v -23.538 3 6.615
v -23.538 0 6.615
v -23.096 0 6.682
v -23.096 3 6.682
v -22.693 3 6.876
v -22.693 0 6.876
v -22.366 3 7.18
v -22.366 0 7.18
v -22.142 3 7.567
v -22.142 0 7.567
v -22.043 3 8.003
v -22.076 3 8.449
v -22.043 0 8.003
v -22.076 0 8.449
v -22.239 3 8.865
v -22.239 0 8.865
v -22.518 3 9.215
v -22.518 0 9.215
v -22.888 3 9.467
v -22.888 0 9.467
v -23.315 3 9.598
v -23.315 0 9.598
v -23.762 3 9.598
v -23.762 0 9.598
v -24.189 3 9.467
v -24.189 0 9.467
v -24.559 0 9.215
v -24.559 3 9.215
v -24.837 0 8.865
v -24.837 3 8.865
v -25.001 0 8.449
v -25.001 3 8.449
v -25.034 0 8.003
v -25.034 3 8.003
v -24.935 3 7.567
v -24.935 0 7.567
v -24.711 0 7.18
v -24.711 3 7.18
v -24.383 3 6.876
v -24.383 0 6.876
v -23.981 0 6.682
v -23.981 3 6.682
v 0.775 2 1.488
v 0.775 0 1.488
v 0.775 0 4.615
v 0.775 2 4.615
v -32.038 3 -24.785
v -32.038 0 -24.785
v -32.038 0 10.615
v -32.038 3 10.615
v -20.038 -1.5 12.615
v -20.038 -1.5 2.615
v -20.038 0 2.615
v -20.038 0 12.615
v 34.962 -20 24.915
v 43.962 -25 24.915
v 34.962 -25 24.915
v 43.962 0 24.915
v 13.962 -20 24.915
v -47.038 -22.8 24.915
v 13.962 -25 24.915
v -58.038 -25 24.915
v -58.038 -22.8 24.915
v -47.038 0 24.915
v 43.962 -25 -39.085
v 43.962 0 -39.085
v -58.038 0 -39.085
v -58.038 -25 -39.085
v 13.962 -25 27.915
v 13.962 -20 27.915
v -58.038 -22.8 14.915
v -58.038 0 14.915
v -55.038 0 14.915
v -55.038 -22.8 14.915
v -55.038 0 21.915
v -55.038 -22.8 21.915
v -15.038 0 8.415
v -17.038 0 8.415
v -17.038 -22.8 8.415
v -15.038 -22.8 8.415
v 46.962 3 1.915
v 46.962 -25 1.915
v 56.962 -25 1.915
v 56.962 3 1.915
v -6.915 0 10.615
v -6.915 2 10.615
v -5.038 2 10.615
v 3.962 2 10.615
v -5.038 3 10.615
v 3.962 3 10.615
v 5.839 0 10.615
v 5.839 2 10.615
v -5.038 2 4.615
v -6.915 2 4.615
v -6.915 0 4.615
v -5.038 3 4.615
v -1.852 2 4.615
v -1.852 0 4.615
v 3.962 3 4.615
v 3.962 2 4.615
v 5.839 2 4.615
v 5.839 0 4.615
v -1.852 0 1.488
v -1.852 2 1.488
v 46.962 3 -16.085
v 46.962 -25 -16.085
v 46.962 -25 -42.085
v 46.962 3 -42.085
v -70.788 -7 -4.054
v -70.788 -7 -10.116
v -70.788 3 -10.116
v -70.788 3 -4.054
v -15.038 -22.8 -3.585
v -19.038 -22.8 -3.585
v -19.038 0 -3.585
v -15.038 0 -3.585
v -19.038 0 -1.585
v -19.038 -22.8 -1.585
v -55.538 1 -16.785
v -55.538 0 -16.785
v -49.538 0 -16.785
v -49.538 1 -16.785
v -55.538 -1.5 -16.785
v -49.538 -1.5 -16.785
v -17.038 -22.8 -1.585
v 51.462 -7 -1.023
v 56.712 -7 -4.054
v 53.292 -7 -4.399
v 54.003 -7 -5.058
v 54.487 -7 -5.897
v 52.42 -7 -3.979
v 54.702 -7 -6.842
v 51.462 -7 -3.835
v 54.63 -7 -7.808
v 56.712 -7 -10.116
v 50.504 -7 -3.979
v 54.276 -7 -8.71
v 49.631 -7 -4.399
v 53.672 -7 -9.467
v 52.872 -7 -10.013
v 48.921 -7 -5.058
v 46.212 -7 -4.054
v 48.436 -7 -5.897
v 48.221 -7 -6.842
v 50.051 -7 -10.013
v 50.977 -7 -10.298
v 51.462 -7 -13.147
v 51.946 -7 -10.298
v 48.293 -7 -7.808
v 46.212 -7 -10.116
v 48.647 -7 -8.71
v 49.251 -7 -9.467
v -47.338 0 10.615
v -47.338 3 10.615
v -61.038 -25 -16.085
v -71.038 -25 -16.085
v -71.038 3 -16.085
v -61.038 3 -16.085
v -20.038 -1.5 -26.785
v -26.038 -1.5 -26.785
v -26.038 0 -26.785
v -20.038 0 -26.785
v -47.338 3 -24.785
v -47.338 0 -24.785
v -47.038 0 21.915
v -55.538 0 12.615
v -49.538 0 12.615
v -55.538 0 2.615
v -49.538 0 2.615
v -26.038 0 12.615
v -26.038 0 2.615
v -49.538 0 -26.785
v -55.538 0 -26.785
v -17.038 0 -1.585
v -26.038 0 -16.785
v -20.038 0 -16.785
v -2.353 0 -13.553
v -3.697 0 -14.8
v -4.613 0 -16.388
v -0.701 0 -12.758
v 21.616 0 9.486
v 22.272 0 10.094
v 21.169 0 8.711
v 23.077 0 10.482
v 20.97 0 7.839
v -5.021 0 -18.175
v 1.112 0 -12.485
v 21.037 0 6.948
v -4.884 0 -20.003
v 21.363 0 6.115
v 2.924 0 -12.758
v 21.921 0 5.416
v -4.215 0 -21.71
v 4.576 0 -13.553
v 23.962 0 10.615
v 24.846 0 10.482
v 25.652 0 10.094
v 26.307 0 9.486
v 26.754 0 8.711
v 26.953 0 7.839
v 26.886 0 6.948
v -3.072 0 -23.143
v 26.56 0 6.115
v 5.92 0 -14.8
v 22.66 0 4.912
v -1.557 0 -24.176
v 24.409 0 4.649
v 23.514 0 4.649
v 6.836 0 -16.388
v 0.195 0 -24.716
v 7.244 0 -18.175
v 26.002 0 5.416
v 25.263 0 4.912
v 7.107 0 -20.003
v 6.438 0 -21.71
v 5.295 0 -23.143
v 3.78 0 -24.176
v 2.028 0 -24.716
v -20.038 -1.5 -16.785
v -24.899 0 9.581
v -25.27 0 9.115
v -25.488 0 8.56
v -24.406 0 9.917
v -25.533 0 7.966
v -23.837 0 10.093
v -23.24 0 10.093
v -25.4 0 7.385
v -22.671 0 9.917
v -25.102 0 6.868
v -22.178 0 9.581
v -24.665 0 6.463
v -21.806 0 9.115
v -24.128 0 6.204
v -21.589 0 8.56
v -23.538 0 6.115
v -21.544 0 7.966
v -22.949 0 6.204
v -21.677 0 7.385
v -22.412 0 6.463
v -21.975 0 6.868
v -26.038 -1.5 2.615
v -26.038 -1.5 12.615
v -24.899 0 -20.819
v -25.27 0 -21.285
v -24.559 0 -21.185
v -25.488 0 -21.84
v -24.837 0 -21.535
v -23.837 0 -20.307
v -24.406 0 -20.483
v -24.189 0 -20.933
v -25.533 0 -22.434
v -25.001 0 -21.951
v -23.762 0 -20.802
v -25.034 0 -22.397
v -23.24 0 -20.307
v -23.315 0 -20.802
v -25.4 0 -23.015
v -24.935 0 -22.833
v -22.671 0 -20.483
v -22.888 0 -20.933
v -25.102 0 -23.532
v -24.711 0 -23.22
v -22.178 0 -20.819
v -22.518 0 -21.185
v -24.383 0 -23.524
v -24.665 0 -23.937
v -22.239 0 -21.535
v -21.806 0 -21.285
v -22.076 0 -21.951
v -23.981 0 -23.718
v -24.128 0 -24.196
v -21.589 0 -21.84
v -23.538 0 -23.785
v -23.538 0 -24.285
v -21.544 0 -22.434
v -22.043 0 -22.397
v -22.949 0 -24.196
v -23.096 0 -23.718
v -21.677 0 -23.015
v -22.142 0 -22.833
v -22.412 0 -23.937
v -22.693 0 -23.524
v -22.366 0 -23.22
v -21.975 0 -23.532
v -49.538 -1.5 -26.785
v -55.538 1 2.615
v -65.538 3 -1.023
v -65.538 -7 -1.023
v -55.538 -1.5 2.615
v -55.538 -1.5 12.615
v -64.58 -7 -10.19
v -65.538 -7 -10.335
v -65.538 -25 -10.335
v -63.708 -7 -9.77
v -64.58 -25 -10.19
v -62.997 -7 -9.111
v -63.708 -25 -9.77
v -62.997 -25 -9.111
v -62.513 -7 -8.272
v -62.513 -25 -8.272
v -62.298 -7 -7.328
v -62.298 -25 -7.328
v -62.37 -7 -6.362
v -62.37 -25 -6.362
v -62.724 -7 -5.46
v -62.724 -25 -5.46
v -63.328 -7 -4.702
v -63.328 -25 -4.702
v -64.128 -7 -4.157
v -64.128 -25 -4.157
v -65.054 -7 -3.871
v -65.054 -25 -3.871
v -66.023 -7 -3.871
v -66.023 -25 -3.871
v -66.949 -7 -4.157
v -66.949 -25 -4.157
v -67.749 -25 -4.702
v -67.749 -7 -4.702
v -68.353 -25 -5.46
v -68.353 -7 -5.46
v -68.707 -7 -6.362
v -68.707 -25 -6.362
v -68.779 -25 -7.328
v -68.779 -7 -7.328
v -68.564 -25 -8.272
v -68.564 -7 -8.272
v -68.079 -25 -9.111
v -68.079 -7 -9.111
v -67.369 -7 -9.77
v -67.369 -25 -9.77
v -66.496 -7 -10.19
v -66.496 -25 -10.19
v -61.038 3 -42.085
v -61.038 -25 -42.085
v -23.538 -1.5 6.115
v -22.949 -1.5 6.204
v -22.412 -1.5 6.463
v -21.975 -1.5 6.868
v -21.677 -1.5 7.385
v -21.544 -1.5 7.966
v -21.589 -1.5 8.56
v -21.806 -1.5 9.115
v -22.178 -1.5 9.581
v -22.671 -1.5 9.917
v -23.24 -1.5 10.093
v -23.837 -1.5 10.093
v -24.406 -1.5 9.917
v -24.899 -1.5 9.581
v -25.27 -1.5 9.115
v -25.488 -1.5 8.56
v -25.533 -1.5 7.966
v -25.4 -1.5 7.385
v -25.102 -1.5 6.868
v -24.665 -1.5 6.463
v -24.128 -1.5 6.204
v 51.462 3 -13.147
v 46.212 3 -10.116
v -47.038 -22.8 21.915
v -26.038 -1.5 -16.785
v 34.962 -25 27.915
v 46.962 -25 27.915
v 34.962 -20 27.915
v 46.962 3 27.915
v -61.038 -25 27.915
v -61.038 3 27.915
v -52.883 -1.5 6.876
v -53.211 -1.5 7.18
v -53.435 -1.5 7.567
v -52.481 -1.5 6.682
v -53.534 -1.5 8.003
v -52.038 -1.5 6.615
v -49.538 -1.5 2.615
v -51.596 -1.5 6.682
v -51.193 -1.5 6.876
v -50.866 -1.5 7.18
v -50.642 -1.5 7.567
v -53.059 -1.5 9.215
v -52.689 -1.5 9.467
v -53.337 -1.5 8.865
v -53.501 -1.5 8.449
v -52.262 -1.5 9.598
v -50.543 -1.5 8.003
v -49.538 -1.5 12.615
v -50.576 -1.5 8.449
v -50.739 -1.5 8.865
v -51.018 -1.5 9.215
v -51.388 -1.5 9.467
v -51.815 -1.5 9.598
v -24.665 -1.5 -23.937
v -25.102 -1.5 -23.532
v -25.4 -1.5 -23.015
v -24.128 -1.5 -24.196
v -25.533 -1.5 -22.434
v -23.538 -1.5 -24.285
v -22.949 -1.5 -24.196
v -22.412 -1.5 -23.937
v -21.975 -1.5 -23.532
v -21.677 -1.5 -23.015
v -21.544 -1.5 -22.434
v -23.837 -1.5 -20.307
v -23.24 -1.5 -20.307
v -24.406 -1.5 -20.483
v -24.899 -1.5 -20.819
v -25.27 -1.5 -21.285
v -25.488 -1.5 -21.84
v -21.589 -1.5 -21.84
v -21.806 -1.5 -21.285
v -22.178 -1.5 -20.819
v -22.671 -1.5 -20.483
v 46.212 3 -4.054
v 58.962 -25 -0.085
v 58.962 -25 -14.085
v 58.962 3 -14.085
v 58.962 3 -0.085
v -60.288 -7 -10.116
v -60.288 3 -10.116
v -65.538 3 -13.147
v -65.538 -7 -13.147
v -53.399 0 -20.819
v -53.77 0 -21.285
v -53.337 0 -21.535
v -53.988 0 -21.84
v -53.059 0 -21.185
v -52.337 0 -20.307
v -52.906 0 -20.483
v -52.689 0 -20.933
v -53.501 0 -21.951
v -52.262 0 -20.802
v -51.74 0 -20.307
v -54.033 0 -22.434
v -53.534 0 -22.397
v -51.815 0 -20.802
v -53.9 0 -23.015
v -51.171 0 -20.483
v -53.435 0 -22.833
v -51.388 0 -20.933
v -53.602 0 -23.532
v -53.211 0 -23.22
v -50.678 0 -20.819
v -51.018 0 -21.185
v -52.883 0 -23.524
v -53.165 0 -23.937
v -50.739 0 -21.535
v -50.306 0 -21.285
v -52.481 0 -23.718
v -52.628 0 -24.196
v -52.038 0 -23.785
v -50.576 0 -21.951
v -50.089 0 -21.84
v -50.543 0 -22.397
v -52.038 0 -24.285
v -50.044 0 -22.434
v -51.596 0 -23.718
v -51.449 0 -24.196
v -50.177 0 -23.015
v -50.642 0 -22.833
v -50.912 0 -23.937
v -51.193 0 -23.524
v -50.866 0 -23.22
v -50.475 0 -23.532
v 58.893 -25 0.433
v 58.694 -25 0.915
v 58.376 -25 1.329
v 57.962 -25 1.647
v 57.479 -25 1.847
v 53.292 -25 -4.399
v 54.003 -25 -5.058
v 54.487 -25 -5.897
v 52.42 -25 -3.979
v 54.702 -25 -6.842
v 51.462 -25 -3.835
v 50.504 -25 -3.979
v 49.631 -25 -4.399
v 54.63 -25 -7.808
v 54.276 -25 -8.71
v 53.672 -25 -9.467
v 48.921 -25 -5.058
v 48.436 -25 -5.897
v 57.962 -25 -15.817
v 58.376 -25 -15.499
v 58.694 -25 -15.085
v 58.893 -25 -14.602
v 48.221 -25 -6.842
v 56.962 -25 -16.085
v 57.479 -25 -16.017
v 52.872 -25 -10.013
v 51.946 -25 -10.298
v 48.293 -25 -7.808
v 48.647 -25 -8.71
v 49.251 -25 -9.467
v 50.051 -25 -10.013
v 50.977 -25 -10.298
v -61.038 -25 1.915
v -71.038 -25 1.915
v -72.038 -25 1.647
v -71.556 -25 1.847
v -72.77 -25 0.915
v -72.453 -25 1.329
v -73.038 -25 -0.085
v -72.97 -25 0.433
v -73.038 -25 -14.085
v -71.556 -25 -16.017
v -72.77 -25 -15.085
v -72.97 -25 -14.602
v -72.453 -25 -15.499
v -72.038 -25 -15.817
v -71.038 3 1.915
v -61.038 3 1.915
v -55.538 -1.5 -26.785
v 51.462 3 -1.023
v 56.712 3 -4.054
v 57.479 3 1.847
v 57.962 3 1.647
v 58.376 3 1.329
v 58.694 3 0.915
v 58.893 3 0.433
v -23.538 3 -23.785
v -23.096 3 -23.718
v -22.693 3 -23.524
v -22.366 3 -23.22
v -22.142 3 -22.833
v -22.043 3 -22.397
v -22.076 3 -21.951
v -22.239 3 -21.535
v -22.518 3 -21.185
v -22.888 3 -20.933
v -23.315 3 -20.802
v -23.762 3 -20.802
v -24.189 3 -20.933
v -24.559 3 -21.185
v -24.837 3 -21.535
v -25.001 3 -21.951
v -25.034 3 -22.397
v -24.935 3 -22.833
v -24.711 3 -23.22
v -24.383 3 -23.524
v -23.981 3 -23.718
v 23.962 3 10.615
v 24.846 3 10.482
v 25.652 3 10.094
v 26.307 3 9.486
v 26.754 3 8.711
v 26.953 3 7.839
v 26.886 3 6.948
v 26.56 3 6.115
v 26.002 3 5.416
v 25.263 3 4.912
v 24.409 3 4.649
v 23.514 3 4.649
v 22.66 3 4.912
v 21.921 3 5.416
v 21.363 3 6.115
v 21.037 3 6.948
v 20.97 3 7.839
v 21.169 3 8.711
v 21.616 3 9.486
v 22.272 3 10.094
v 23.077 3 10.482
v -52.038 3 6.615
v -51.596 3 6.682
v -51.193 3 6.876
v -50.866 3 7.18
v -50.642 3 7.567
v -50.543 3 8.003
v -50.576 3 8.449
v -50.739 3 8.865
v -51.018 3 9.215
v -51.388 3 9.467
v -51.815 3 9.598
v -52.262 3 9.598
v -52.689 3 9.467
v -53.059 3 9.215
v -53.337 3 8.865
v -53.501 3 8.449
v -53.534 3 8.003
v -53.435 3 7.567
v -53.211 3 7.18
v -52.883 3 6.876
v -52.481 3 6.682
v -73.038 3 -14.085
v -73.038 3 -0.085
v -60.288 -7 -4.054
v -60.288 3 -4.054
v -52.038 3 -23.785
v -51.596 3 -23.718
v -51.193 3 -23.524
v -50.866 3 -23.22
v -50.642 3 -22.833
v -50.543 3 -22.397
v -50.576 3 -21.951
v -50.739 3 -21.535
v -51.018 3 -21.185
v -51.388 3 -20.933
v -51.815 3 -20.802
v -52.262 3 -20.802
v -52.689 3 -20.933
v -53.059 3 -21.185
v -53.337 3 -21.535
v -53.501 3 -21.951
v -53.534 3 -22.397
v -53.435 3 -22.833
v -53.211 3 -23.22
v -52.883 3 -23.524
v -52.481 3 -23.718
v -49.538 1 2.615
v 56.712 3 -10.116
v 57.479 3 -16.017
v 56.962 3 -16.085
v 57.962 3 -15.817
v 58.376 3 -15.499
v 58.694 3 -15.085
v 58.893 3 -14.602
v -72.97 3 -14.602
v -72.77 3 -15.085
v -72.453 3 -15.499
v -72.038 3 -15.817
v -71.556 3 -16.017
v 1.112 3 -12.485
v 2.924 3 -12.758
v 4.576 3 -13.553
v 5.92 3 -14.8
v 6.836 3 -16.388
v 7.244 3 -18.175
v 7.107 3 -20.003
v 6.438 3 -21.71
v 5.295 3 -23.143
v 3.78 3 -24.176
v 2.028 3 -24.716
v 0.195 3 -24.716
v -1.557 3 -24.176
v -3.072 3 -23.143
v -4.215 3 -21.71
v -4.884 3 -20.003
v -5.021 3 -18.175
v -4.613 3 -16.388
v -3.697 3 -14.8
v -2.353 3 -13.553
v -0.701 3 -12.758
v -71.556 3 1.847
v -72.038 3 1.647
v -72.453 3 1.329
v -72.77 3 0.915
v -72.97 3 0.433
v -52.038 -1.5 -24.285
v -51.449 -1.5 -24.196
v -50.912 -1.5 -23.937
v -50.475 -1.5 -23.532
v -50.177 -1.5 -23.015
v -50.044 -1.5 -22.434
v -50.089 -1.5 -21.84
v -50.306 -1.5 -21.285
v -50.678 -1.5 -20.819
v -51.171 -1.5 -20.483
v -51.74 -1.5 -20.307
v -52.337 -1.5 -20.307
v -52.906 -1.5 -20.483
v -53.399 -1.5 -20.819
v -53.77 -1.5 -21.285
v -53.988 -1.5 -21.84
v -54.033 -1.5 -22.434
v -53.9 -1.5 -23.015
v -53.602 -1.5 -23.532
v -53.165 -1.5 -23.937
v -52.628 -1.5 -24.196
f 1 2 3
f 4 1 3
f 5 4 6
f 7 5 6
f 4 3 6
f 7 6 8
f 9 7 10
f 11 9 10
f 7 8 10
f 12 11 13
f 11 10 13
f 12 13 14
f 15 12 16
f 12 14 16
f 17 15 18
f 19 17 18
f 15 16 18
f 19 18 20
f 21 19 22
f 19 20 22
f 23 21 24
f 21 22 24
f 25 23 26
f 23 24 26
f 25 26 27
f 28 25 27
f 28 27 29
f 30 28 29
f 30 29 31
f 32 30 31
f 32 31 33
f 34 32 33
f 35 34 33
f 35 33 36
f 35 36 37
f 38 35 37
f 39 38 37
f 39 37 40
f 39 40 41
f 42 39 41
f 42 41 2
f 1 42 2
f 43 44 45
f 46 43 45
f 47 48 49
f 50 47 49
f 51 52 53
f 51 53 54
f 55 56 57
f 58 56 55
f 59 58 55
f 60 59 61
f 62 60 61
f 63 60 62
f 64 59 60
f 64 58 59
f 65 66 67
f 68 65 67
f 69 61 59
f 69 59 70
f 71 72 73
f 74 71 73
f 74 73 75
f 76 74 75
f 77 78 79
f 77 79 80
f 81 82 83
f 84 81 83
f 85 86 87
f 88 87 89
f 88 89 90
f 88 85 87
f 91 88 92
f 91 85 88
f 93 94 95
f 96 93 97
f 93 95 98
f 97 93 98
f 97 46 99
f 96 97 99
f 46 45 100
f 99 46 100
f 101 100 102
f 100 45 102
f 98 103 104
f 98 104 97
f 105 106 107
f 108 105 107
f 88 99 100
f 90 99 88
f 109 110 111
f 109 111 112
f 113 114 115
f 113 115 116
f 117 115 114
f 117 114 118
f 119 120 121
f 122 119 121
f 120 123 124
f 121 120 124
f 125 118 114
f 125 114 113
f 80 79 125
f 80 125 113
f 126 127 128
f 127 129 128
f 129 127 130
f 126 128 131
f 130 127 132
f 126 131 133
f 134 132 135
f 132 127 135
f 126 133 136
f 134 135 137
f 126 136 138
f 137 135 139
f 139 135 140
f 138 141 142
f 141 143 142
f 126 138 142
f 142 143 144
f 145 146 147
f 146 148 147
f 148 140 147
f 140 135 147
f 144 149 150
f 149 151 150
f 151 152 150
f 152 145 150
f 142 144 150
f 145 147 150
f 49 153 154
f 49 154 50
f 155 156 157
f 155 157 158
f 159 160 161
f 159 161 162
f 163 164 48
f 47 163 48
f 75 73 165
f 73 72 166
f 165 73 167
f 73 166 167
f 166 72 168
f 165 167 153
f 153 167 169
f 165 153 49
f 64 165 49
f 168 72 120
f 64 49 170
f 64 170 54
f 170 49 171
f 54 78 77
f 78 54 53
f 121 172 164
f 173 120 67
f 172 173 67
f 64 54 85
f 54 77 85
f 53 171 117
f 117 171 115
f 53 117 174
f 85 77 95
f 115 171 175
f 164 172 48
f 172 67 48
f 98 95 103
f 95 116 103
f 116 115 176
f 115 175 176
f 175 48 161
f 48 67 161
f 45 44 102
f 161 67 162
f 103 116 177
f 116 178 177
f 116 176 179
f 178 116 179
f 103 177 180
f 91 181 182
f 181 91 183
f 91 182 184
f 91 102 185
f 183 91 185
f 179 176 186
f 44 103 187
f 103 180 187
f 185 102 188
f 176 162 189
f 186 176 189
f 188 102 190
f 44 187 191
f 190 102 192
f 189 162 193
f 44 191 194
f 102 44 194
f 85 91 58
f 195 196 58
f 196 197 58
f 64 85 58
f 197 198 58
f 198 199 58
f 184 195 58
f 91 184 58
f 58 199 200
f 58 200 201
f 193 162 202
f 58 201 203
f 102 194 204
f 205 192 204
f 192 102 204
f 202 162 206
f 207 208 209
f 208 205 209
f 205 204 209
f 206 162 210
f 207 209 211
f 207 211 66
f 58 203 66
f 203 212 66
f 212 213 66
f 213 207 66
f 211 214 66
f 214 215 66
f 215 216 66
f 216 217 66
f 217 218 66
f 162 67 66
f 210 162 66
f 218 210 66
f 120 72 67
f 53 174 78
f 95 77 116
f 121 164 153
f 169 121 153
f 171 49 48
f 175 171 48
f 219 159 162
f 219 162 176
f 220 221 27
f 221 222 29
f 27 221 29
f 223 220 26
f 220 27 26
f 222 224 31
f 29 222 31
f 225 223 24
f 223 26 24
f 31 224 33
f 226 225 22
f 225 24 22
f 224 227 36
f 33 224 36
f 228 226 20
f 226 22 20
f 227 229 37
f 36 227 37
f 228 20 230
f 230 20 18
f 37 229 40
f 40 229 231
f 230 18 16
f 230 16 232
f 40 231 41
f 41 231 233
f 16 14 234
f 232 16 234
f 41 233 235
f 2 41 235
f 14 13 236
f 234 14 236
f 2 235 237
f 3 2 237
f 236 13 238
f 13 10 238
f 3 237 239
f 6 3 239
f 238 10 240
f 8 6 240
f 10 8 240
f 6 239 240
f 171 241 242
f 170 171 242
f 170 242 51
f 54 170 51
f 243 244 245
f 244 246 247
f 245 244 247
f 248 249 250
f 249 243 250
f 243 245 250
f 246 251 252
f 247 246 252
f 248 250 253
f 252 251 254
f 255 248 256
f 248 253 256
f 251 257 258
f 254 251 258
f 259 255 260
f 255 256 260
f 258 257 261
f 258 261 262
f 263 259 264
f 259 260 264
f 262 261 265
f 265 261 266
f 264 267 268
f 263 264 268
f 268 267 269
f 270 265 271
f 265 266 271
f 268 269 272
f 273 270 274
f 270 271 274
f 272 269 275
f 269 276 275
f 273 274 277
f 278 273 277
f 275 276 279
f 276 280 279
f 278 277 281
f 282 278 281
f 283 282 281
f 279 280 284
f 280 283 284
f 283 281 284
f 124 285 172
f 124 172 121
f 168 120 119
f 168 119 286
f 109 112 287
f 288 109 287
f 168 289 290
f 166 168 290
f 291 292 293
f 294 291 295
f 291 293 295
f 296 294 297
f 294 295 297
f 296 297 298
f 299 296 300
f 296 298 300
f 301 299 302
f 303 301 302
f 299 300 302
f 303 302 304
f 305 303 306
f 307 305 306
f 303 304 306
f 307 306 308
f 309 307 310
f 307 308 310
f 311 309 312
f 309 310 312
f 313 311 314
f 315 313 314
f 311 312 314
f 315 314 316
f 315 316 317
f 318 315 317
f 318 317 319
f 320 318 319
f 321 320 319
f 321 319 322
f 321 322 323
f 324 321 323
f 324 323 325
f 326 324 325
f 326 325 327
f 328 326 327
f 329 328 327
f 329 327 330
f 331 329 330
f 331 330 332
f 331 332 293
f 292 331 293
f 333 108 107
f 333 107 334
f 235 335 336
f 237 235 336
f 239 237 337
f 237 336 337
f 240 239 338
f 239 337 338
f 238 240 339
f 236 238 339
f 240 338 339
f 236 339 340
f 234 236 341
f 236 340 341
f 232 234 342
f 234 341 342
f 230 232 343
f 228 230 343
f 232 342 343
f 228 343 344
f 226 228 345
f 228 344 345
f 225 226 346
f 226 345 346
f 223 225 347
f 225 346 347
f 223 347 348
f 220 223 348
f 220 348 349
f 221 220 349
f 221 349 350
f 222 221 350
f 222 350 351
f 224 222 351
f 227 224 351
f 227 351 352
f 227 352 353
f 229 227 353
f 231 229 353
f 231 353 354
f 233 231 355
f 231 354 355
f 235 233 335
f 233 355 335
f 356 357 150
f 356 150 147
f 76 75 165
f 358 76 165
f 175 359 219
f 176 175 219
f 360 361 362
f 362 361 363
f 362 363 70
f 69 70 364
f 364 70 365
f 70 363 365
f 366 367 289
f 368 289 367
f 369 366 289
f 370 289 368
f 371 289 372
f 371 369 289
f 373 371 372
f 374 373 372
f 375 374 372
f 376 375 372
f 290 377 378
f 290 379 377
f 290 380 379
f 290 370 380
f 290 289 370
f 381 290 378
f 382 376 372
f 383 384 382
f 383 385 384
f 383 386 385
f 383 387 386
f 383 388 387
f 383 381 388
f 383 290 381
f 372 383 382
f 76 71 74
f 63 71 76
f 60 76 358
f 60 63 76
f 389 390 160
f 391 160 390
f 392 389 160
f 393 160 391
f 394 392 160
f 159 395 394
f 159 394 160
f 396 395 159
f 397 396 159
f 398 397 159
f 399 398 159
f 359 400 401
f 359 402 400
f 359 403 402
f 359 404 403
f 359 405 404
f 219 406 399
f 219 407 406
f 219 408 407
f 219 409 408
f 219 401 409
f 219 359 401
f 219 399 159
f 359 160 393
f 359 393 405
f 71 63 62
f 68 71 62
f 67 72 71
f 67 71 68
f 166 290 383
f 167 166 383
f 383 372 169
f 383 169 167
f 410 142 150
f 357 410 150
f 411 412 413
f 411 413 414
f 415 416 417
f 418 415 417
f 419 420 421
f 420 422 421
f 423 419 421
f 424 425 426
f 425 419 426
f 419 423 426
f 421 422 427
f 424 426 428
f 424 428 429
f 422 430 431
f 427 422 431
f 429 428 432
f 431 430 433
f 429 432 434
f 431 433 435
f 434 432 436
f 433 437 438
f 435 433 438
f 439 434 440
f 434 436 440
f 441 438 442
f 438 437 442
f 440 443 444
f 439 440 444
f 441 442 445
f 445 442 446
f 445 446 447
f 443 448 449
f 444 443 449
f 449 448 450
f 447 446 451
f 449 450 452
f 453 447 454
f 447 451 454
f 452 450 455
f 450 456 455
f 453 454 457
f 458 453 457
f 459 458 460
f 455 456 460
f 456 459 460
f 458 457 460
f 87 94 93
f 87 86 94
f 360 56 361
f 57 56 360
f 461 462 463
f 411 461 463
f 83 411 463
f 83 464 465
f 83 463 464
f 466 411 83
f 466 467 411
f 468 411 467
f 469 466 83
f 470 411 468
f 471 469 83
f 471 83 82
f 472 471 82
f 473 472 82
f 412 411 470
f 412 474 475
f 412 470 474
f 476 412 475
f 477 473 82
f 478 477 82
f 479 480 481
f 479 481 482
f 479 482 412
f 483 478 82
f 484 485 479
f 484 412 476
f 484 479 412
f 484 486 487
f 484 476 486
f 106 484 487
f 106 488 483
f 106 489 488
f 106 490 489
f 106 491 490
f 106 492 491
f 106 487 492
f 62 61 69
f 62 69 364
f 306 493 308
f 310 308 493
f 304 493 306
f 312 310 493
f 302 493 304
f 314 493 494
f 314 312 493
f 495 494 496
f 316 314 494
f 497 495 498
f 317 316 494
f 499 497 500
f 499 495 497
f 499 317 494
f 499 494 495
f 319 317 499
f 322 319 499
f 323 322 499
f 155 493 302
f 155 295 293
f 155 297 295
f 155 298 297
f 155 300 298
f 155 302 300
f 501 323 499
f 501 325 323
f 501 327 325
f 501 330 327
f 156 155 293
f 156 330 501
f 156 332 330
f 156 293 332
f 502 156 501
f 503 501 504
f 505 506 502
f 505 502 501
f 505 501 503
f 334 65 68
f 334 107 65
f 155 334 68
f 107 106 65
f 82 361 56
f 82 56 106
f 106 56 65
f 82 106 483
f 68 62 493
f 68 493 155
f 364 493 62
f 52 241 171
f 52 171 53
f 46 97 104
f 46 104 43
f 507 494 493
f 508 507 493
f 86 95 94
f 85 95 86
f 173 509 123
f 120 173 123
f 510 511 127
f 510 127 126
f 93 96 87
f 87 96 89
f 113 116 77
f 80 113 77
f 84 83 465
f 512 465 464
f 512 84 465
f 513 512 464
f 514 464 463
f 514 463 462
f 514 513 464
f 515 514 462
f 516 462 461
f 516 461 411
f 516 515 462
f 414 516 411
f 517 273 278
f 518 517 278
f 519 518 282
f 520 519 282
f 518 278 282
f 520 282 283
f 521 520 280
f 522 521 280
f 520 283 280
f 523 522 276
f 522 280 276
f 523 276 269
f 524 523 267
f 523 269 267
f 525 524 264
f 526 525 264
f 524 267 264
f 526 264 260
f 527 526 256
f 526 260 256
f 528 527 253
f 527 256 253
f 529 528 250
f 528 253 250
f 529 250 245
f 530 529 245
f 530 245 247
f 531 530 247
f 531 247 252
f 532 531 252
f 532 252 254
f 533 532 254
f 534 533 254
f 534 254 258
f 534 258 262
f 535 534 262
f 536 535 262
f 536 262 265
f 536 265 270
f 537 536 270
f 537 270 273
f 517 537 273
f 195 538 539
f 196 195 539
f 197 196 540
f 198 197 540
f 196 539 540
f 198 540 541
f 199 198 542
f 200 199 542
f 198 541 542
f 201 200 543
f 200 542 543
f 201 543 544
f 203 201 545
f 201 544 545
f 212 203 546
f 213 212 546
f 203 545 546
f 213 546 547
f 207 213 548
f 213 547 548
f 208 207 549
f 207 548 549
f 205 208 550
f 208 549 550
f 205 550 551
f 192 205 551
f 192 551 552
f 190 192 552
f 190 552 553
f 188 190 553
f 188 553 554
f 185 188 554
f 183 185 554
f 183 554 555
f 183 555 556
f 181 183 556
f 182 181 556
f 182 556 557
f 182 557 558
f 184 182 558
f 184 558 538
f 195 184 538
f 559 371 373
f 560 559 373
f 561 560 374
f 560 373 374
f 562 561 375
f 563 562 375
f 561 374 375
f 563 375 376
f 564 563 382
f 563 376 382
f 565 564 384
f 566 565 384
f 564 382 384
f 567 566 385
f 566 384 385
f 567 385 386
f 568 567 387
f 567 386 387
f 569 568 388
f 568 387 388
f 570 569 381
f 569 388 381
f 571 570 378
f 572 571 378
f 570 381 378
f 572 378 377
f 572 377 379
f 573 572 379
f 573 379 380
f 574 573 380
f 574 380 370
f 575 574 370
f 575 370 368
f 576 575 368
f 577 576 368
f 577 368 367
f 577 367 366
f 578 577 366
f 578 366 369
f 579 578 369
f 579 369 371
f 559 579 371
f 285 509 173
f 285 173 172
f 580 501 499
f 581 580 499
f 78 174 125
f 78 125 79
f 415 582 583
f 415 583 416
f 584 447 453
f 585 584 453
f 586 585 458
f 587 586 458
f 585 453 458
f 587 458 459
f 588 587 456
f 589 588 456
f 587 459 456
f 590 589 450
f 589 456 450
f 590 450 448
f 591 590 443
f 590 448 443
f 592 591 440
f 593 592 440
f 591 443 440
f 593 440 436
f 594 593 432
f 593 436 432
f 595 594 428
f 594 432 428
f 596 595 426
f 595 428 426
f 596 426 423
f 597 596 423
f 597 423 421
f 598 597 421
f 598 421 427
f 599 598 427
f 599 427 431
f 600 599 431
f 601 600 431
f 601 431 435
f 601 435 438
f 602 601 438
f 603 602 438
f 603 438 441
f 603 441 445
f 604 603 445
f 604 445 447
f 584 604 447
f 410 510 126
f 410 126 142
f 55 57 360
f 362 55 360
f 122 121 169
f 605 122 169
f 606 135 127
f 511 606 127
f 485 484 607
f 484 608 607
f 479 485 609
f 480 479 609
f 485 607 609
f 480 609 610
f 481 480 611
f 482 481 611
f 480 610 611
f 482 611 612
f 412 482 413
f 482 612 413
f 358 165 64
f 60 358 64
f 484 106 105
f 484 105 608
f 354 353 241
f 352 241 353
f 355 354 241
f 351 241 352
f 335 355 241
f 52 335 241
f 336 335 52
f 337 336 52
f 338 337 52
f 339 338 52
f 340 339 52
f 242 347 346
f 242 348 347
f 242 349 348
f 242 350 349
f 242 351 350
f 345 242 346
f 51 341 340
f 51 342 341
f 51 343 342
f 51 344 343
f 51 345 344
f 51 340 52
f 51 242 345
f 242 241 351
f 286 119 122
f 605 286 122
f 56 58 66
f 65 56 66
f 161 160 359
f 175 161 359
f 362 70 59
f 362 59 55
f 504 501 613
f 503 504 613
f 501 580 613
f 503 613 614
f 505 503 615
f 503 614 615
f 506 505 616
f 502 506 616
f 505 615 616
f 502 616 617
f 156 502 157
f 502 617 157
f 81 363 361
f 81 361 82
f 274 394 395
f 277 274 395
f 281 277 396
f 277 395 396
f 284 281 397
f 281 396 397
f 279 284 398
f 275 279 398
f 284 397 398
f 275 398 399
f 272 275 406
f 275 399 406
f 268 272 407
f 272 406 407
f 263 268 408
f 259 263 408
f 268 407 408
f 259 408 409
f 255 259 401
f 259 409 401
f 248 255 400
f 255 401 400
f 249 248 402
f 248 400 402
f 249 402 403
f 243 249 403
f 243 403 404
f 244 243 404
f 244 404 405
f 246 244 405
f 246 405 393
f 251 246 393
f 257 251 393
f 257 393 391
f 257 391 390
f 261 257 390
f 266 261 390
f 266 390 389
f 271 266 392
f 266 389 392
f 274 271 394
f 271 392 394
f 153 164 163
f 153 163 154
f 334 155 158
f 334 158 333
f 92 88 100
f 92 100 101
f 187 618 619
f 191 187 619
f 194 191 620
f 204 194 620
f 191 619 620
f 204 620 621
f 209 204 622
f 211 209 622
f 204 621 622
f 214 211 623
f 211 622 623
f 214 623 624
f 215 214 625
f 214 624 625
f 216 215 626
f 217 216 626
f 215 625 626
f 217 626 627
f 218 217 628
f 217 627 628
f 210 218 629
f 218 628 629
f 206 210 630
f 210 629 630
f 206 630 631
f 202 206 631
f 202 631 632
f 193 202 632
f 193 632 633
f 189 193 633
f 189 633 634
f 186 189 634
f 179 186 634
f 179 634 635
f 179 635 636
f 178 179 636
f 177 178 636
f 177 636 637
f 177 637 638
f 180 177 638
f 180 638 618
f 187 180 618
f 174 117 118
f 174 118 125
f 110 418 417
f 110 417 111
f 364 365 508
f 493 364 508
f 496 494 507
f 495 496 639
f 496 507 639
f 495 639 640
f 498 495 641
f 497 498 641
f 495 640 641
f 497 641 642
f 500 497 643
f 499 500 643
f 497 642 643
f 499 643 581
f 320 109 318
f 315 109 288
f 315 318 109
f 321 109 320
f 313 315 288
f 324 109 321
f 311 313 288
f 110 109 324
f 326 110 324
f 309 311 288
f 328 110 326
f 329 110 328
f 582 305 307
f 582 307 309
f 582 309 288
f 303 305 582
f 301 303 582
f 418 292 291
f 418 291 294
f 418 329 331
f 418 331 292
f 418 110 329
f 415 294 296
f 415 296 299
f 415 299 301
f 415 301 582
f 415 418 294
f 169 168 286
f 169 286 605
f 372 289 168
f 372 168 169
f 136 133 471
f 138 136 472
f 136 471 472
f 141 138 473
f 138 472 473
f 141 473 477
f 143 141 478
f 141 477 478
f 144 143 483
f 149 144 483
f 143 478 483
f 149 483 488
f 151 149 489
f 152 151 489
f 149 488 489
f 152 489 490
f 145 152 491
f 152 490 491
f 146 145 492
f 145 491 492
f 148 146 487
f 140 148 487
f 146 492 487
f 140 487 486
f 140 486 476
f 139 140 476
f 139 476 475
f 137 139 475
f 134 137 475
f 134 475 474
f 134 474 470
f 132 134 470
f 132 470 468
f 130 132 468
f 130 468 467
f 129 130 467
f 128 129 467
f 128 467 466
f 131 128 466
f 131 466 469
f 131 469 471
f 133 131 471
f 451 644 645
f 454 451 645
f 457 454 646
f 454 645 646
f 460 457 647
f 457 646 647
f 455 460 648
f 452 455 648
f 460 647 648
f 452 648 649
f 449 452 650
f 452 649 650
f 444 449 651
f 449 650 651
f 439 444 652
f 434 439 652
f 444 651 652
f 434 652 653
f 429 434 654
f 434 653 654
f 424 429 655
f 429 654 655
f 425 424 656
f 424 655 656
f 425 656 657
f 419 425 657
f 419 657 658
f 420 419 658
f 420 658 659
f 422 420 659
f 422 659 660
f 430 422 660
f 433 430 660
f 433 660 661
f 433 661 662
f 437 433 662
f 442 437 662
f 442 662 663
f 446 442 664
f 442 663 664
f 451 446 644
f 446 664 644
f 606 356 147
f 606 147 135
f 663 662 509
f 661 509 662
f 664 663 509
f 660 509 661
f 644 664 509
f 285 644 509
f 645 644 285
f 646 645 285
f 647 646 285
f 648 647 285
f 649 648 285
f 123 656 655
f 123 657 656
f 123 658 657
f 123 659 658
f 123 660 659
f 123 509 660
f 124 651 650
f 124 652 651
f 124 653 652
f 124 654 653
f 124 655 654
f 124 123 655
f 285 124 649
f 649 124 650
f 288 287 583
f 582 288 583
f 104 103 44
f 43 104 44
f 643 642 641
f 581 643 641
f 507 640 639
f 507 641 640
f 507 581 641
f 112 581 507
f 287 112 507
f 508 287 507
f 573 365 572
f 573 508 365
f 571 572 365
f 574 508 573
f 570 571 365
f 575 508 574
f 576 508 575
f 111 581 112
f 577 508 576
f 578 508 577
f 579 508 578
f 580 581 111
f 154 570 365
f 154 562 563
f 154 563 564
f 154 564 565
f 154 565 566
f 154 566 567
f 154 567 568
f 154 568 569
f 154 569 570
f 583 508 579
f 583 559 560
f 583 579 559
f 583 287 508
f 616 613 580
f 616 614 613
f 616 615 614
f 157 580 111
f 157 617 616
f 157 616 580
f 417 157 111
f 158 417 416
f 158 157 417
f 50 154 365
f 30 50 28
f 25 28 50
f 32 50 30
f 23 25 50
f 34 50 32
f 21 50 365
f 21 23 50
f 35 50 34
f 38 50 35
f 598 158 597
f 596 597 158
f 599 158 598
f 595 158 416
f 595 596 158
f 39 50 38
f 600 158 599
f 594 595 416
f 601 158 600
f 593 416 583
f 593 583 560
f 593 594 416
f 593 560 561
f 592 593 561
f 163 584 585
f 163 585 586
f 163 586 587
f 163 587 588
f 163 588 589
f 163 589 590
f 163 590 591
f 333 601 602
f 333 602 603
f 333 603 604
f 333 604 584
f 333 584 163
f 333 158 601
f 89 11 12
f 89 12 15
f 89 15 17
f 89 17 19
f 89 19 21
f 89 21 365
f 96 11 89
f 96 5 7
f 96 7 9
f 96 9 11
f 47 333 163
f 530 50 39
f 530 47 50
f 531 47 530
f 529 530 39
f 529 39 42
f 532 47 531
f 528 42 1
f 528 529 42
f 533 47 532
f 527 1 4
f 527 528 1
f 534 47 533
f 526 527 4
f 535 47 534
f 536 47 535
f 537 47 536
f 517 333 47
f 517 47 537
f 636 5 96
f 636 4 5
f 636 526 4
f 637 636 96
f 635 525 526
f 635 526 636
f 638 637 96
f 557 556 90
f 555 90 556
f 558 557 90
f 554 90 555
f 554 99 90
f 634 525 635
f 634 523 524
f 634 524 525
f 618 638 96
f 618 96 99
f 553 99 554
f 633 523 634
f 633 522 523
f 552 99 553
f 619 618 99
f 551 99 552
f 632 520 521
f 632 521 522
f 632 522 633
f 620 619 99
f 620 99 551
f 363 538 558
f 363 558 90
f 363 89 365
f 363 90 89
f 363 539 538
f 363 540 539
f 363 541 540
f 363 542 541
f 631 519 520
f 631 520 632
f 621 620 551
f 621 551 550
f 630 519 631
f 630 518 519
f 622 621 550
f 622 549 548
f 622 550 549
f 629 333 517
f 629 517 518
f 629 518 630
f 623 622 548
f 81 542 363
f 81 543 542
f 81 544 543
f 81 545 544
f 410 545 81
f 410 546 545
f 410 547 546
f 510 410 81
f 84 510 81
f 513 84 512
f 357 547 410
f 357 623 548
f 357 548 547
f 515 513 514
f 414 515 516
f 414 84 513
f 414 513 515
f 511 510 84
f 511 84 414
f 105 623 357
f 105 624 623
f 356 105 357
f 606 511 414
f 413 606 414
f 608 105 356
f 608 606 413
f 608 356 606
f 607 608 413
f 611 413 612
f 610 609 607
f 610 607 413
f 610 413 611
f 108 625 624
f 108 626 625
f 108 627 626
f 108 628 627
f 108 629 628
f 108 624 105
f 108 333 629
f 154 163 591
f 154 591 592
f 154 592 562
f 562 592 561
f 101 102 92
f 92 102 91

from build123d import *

# Parameters (mm, degrees)
SKETCH2_W           = 108
SKETCH2_H           = 70
BOSS_EXTRUDE1_DEPTH = 3
SKETCH7_W           = 108
SKETCH7_H           = 70
SKETCH7_W_2         = 102
SKETCH7_H_2         = 64
BOSS_EXTRUDE4_DEPTH = 25
SKETCH16_W          = 2
SKETCH16_H          = 10
SKETCH16_W_2        = 8
SKETCH16_H_2        = 3
SKETCH16_W_3        = 4
SKETCH16_H_3        = 2
BOSS_EXTRUDE5_DEPTH = 22.8
SKETCH19_W          = 6
SKETCH19_H          = 19.4
CUT_EXTRUDE10_DEPTH = 1
SKETCH18_R          = 1.5
SKETCH18_W          = 15.3
SKETCH18_H          = 35.4
CUT_EXTRUDE9_DEPTH  = 79.242054464
BOSS_EXTRUDE6_START = 1.5
SKETCH20_W          = 6
SKETCH20_H          = 10
SKETCH20_R          = 1.5
SKETCH20_R_2        = 2
BOSS_EXTRUDE6_DEPTH = 1.5
SKETCH21_W          = 9
SKETCH21_H          = 6
CUT_EXTRUDE11_DEPTH = 1
SKETCH23_W          = 2.627
SKETCH23_H          = 3.127
SKETCH23_W_2        = 12.754
SKETCH23_H_2        = 6
CUT_EXTRUDE13_DEPTH = 2
SKETCH24_R          = 6.15
SKETCH24_R_2        = 3
CUT_EXTRUDE14_DEPTH = 80.251618827
SKETCH28_W          = 21
SKETCH28_H          = 3
CUT_EXTRUDE15_DEPTH = 5
SKETCH31_W          = 12
SKETCH31_H          = 18
SKETCH31_R          = 3.25
BOSS_EXTRUDE8_DEPTH = 28
FILLET1_R           = 2
CUT_EXTRUDE17_DEPTH = 10


with BuildPart() as part:
    # Sketch2 → Boss-Extrude1 (new body)
    with BuildSketch(Plane(origin=(0, 0, 0), x_dir=(1, 0, 0), z_dir=(0, 1, 0))):
        with Locations((-7.038444533, 7.084764176)):
            Rectangle(SKETCH2_W, SKETCH2_H)
    extrude(amount=BOSS_EXTRUDE1_DEPTH)

    # Sketch7 → Boss-Extrude4 (add)
    with BuildSketch(Plane(origin=(0, 0, 0), x_dir=(-1, 0, 0), z_dir=(0, -1, 0))):
        with Locations((7.038444533, 7.084764176)):
            Rectangle(SKETCH7_W, SKETCH7_H)
        with Locations((7.038444533, 7.084764176)):
            Rectangle(SKETCH7_W_2, SKETCH7_H_2, mode=Mode.SUBTRACT)
    extrude(amount=BOSS_EXTRUDE4_DEPTH)

    # Sketch16 → Boss-Extrude5 (add)
    with BuildSketch(Plane.XZ):
        with Locations((-16.038444533, 3.415235824)):
            Rectangle(SKETCH16_W, SKETCH16_H)
        Polygon((-58.038444533, 14.915235824), (-55.038444533, 14.915235824), (-55.038444533, 21.915235824), (-55.038444533, 24.915235824), (-58.038444533, 24.915235824), align=None)
        with Locations((-51.038444533, 23.415235824)):
            Rectangle(SKETCH16_W_2, SKETCH16_H_2)
        with Locations((-17.038444533, -2.584764176)):
            Rectangle(SKETCH16_W_3, SKETCH16_H_3)
    extrude(amount=BOSS_EXTRUDE5_DEPTH)

    # Sketch19 → Cut-Extrude10 (cut)
    with BuildSketch(Plane.XZ):
        with Locations((-52.538444533, -7.084764176)):
            Rectangle(SKETCH19_W, SKETCH19_H)
    extrude(amount=-CUT_EXTRUDE10_DEPTH, mode=Mode.SUBTRACT)

    # Sketch18 → Cut-Extrude9 (cut, through all)
    with BuildSketch(Plane.XZ):
        with Locations(Location((-52.038444533, -22.284764176, 0), (0, 0, 270))):
            Circle(SKETCH18_R)
        with Locations(Location((-23.538444533, -22.284764176, 0), (0, 0, 270))):
            Circle(SKETCH18_R)
        with Locations(Location((-23.538444533, 8.115235824, 0), (0, 0, 270))):
            Circle(SKETCH18_R)
        with Locations(Location((-52.038444533, 8.115235824, 0), (0, 0, 270))):
            Circle(SKETCH18_R)
        with Locations((-39.688444533, -7.084764176)):
            Rectangle(SKETCH18_W, SKETCH18_H)
    extrude(amount=-CUT_EXTRUDE9_DEPTH, mode=Mode.SUBTRACT)

    # Sketch20 → Boss-Extrude6 (add)
    # profile 1 of 4: a face of its own
    with BuildSketch(Plane.XZ.offset(BOSS_EXTRUDE6_START)):
        with Locations((-52.538444533, 7.615235824)):
            Rectangle(SKETCH20_W, SKETCH20_H)
        with Locations(Location((-52.038444533, 8.115235824, 0), (0, 0, 270))):
            Circle(SKETCH20_R, mode=Mode.SUBTRACT)
    # profile 2 of 4: a face of its own
    with BuildSketch(Plane.XZ.offset(BOSS_EXTRUDE6_START)):
        with Locations((-52.538444533, -21.784764176)):
            Rectangle(SKETCH20_W, SKETCH20_H)
        with Locations(Location((-52.038444533, -22.284764176, 0), (0, 0, 270))):
            Circle(SKETCH20_R_2, mode=Mode.SUBTRACT)
    # profile 3 of 4: a face of its own
    with BuildSketch(Plane.XZ.offset(BOSS_EXTRUDE6_START)):
        with Locations((-23.038444533, -21.784764176)):
            Rectangle(SKETCH20_W, SKETCH20_H)
        with Locations(Location((-23.538444533, -22.284764176, 0), (0, 0, 270))):
            Circle(SKETCH20_R_2, mode=Mode.SUBTRACT)
    # profile 4 of 4: a face of its own
    with BuildSketch(Plane.XZ.offset(BOSS_EXTRUDE6_START)):
        with Locations((-23.038444533, 7.615235824)):
            Rectangle(SKETCH20_W, SKETCH20_H)
        with Locations(Location((-23.538444533, 8.115235824, 0), (0, 0, 270))):
            Circle(SKETCH20_R_2, mode=Mode.SUBTRACT)
    extrude(amount=-BOSS_EXTRUDE6_DEPTH)

    # Sketch21 → Cut-Extrude11 (cut)
    with BuildSketch(Plane.XZ.offset(-3)):
        with Locations((-0.538444533, 7.615235824)):
            Rectangle(SKETCH21_W, SKETCH21_H)
    extrude(amount=CUT_EXTRUDE11_DEPTH, mode=Mode.SUBTRACT)

    # Sketch23 → Cut-Extrude13 (cut)
    with BuildSketch(Plane.XZ):
        with Locations((-0.538444533, 3.051735824)):
            Rectangle(SKETCH23_W, SKETCH23_H)
        with Locations((-0.538444533, 7.615235824)):
            Rectangle(SKETCH23_W_2, SKETCH23_H_2)
    extrude(amount=-CUT_EXTRUDE13_DEPTH, mode=Mode.SUBTRACT)

    # Sketch24 → Cut-Extrude14 (cut, through all)
    with BuildSketch(Plane(origin=(0, 3, 0), x_dir=(1, 0, 0), z_dir=(0, 1, 0))):
        with Locations(Location((1.111555467, 18.634764176, 0), (0, 0, 270))):
            Circle(SKETCH24_R)
        with Locations(Location((23.961555467, -7.615235824, 0), (0, 0, 270))):
            Circle(SKETCH24_R_2)
    extrude(amount=-CUT_EXTRUDE14_DEPTH, mode=Mode.SUBTRACT)

    # Sketch28 → Cut-Extrude15 (cut)
    with BuildSketch(Plane.XZ.offset(25)):
        with Locations((24.461555467, 26.415235824)):
            Rectangle(SKETCH28_W, SKETCH28_H)
    extrude(amount=-CUT_EXTRUDE15_DEPTH, mode=Mode.SUBTRACT)

    # Sketch31 → Boss-Extrude8 (add)
    # profile 1 of 2: a face of its own
    with BuildSketch(Plane.XZ.offset(25)):
        with Locations((-67.038444533, -7.084764176)):
            Rectangle(SKETCH31_W, SKETCH31_H)
        with Locations(Location((-65.538444533, -7.084764176, 0), (0, 0, 270))):
            Circle(SKETCH31_R, mode=Mode.SUBTRACT)
    # profile 2 of 2: a face of its own
    with BuildSketch(Plane.XZ.offset(25)):
        with Locations((52.961555467, -7.084764176)):
            Rectangle(SKETCH31_W, SKETCH31_H)
        with Locations(Location((51.461555467, -7.084764176, 0), (0, 0, 90))):
            Circle(SKETCH31_R, mode=Mode.SUBTRACT)
    extrude(amount=-BOSS_EXTRUDE8_DEPTH)

    # Fillet1
    fillet1_edges = [part.edges().sort_by_distance(p)[0] for p in [
        (-73.038444533, -11, -16.084764176),
        (-73.038444533, -11, 1.915235824),
        (58.961555467, -11, 1.915235824),
        (58.961555467, -11, -16.084764176),
    ]]
    fillet(fillet1_edges, radius=FILLET1_R)

    # Sketch32 → Cut-Extrude17 (cut)
    with BuildSketch(Plane(origin=(0, 3, 0), x_dir=(1, 0, 0), z_dir=(0, 1, 0))):
        Polygon((-60.288444533, 4.053675263), (-60.288444533, 10.115853089), (-65.538444533, 13.146942003), (-70.788444533, 10.115853089), (-70.788444533, 4.053675263), (-65.538444533, 1.02258635), align=None)
        Polygon((51.461555467, 1.02258635), (46.211555467, 4.053675263), (46.211555467, 10.115853089), (51.461555467, 13.146942003), (56.711555467, 10.115853089), (56.711555467, 4.053675263), align=None)
    extrude(amount=-CUT_EXTRUDE17_DEPTH, mode=Mode.SUBTRACT)


solid = part.part
